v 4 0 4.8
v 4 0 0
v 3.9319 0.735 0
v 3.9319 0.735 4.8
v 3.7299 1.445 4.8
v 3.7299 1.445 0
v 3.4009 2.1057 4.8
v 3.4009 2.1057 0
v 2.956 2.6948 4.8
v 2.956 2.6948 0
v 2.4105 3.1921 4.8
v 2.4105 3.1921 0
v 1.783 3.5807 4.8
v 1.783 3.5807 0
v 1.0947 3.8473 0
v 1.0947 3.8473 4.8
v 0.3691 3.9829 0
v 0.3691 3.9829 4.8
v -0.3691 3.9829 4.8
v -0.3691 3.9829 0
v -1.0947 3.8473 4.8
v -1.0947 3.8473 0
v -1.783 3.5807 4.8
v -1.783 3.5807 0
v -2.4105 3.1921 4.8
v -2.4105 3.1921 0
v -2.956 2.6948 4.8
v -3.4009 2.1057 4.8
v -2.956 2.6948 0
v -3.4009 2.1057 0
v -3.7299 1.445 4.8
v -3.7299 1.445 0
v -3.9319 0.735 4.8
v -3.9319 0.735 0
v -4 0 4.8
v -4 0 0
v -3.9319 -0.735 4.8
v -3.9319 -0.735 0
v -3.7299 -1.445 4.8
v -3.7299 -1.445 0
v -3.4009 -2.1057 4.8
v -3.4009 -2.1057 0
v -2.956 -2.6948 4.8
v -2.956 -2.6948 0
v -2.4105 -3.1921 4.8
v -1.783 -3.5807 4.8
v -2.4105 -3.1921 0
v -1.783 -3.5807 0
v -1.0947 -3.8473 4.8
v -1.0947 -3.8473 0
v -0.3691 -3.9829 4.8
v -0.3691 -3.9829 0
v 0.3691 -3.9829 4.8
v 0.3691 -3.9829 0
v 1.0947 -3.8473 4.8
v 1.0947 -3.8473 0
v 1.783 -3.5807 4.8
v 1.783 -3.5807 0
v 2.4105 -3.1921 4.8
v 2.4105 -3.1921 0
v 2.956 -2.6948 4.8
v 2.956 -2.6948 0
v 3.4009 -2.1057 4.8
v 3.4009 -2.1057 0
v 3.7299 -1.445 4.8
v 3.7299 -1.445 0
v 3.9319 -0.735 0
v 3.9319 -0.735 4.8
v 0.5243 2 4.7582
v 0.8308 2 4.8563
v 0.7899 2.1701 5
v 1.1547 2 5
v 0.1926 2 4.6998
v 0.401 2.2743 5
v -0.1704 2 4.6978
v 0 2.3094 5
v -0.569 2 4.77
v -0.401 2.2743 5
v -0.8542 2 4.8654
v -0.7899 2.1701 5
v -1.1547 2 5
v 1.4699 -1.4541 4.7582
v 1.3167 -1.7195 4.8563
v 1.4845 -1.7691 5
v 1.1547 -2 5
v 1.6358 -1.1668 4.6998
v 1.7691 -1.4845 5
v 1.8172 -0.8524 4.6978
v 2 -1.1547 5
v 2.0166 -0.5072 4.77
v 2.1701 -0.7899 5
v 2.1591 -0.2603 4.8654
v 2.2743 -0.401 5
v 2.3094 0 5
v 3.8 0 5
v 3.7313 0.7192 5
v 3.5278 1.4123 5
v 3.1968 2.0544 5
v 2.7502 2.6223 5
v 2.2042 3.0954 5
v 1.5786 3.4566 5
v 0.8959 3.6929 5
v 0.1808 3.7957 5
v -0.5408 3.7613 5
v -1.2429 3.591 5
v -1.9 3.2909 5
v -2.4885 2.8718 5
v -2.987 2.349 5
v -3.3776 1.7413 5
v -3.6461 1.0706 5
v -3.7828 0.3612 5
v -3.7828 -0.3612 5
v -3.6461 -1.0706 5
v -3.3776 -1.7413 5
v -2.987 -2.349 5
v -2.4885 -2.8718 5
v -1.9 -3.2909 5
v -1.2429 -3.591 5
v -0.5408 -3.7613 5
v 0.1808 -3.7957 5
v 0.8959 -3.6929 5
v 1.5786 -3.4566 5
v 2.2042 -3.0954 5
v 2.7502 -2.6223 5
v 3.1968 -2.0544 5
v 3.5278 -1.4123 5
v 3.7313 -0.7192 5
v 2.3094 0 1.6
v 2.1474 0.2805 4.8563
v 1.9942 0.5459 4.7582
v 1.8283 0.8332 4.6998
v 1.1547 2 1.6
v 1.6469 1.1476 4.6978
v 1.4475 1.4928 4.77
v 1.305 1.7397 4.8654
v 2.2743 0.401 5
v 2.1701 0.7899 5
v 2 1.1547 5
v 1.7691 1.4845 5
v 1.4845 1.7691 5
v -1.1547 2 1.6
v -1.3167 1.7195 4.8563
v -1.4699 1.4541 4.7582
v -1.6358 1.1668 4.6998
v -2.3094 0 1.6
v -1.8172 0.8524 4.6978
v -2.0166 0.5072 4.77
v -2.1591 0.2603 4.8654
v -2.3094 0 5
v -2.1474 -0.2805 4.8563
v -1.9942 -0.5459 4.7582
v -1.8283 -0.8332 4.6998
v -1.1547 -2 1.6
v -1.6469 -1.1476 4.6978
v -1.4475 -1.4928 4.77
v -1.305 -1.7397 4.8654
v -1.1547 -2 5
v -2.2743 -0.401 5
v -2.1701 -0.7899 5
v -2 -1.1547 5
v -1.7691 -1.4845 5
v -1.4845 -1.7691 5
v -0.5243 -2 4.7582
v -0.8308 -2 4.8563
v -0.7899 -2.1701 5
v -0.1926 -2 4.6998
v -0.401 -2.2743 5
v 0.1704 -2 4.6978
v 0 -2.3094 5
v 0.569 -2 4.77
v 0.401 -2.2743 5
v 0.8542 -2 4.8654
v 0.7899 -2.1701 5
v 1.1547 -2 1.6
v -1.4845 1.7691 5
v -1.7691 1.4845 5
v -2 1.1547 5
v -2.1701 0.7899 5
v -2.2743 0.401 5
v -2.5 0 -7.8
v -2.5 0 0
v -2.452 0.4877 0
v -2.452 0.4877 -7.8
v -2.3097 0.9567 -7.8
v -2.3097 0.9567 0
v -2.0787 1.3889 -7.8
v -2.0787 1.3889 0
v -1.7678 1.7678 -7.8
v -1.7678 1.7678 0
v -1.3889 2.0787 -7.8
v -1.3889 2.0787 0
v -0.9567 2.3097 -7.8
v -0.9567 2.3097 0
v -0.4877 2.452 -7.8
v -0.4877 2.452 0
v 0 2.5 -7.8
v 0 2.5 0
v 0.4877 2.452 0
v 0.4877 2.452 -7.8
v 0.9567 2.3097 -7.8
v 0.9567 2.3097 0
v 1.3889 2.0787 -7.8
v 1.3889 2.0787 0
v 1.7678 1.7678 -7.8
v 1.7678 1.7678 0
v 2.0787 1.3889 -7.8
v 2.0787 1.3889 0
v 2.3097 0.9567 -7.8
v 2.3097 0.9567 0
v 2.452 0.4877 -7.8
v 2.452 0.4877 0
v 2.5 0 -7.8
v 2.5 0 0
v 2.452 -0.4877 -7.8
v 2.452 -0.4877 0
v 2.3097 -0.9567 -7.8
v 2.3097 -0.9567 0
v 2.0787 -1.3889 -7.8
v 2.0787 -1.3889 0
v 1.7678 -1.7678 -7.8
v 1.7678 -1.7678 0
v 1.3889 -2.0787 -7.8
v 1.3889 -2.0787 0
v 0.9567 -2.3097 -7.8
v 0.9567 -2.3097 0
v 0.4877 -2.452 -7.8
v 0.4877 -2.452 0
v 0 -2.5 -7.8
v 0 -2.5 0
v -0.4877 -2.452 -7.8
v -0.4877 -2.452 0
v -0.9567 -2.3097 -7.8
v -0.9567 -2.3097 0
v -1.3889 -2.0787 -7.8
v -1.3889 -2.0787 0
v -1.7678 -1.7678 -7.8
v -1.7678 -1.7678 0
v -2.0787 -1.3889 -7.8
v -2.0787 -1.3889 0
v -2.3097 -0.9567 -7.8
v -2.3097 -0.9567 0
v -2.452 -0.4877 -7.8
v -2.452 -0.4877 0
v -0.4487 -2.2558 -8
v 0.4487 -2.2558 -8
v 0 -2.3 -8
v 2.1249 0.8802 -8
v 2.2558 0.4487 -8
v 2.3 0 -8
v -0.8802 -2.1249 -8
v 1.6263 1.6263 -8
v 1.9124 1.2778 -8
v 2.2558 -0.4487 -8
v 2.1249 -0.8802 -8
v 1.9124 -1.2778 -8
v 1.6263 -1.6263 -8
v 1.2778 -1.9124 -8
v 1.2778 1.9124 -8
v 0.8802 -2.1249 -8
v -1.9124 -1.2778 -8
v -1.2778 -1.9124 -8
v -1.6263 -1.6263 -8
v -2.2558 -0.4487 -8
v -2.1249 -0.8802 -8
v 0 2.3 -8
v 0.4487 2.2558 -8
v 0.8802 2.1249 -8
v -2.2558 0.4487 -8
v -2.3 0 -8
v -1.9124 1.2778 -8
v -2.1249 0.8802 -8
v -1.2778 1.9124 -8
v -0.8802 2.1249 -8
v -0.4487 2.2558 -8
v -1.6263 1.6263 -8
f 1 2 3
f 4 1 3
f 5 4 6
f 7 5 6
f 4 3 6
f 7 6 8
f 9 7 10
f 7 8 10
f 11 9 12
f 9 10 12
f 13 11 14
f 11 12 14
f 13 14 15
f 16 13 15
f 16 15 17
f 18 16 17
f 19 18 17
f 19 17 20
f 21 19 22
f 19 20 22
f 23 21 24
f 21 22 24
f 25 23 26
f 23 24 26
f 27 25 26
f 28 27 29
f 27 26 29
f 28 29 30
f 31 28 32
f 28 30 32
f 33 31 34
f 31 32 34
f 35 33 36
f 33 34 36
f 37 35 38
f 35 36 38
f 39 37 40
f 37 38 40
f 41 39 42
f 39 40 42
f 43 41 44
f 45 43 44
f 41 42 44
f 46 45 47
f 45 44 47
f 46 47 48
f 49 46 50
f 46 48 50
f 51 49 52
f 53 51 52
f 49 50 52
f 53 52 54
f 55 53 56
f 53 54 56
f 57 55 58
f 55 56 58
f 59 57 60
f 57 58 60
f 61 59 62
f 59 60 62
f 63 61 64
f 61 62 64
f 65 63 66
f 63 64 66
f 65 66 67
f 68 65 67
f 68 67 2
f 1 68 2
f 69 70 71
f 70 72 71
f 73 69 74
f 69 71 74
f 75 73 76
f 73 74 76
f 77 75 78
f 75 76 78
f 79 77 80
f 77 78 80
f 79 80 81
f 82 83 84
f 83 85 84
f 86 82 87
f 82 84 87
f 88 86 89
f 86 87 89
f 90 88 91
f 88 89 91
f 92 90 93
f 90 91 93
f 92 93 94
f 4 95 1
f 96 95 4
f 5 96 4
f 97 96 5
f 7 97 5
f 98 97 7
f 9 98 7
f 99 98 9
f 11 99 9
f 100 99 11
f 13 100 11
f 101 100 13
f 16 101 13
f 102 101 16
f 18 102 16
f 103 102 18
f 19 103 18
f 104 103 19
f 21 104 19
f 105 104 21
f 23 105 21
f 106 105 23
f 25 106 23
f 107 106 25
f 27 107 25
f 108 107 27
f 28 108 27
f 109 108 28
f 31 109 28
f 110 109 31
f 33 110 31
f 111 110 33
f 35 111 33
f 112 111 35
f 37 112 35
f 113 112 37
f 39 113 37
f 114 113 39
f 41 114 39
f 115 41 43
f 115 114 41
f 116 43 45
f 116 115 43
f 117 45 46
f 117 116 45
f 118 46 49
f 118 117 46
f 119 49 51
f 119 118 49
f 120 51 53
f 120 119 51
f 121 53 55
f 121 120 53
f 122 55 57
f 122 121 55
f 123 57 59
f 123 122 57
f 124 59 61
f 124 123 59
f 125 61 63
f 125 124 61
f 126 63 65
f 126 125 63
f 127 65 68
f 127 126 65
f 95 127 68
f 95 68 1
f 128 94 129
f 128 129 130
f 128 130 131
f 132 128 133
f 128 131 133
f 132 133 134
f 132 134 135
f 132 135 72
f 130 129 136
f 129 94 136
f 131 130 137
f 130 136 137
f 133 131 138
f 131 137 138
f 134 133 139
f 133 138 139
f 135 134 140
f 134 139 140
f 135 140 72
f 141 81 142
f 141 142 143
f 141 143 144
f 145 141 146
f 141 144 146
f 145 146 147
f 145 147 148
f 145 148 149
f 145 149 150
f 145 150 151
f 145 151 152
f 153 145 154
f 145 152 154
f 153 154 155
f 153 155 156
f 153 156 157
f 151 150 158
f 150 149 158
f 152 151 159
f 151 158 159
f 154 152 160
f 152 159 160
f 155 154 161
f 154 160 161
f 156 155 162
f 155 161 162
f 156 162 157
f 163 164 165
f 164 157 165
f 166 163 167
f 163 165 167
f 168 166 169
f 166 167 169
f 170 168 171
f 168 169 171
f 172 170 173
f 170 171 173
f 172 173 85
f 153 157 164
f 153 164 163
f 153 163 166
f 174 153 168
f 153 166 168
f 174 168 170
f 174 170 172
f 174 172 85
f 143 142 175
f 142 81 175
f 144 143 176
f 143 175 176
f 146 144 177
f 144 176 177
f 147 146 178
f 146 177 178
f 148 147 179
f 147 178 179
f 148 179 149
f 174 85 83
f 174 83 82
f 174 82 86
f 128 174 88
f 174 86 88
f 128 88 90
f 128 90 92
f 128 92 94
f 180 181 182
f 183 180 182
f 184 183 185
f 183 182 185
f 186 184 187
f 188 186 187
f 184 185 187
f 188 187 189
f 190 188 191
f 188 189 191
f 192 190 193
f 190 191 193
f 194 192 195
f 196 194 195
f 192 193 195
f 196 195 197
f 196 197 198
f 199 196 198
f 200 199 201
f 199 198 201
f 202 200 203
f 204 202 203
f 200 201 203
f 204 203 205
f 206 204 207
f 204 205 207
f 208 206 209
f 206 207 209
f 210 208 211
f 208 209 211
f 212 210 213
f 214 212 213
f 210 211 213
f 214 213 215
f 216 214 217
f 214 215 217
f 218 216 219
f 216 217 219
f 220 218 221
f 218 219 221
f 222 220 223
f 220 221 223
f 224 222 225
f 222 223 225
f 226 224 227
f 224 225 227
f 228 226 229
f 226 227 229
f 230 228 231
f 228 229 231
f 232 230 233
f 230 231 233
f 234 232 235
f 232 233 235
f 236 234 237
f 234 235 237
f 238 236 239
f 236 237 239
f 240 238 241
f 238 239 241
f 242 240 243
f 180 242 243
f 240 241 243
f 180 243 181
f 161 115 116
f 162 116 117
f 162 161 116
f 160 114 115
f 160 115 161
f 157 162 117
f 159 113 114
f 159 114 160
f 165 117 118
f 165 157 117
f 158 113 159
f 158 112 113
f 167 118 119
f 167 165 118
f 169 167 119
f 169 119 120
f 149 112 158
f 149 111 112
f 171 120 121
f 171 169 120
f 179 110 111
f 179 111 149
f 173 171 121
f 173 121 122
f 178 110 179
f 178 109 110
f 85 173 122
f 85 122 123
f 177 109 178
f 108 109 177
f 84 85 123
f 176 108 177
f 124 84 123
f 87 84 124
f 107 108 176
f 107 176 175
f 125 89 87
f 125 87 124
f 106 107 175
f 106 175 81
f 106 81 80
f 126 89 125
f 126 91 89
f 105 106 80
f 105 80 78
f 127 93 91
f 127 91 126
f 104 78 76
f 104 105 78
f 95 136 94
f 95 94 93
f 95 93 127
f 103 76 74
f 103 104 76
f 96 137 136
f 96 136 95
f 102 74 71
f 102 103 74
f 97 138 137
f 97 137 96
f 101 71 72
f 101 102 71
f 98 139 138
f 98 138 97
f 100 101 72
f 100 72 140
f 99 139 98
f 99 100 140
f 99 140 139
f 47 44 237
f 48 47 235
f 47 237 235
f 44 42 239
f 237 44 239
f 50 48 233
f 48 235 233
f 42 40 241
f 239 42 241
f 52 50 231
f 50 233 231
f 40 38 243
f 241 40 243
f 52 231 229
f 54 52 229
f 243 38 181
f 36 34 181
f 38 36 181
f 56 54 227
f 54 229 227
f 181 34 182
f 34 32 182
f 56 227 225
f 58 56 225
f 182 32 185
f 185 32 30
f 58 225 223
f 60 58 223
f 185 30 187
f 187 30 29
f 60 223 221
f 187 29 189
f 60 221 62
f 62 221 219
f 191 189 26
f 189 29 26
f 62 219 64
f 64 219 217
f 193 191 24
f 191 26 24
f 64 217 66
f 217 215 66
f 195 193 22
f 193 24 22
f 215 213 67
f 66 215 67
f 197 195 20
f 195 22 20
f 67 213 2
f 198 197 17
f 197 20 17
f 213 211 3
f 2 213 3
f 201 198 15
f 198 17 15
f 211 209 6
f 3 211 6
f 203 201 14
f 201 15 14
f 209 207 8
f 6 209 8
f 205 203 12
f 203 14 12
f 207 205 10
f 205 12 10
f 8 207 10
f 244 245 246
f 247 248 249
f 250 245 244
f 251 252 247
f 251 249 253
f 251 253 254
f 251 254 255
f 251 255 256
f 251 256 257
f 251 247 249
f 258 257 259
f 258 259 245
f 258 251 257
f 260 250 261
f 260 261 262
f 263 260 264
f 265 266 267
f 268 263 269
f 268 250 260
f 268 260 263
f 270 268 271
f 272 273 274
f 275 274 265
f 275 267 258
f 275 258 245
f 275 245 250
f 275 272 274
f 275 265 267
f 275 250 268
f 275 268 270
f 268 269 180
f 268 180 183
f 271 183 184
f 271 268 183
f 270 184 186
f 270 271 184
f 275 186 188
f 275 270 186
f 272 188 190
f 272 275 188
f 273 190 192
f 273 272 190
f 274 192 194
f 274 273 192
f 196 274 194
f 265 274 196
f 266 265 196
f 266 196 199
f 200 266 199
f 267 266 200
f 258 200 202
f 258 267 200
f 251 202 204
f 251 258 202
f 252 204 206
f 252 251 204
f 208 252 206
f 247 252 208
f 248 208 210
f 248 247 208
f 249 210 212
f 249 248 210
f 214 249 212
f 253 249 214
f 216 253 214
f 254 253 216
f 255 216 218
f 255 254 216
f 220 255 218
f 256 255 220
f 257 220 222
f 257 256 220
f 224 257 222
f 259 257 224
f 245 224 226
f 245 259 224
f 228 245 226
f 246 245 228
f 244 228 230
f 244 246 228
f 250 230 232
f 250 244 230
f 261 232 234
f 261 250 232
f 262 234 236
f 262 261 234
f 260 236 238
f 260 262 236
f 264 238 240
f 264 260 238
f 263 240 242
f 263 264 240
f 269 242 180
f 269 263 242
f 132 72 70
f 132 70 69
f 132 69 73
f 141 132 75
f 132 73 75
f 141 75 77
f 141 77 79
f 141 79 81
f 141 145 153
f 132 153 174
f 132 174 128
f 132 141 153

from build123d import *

# Parameters (mm, degrees)
SKETCH_1_R          = 4
EXTRUDE_1_DEPTH     = 5
CUT_EXTRUDE_1_DEPTH = 3.4
SKETCH_3_R          = 2.309401077
CUT_EXTRUDE_2_DEPTH = 3.4
CUT_EXTRUDE_2_DRAFT = -45
CHAMFER_1_SIZE      = 0.2
SKETCH_4_R          = 2.5
EXTRUDE_2_DEPTH     = 8
CHAMFER_2_SIZE      = 0.2


with BuildPart() as part:
    # Эскиз1 → Бобышка-Вытянуть1 (new body)
    with BuildSketch(Plane.XY):
        Circle(SKETCH_1_R)
    extrude(amount=EXTRUDE_1_DEPTH)

    # Эскиз2 → Вырез-Вытянуть1 (cut)
    with BuildSketch(Plane.XY.offset(5)):
        Polygon((2.309401077, 0), (1.154700538, 2), (-1.154700538, 2), (-2.309401077, 0), (-1.154700538, -2), (1.154700538, -2), align=None)
    extrude(amount=-CUT_EXTRUDE_1_DEPTH, mode=Mode.SUBTRACT)


with BuildPart() as cut_extrude_2_tool:
    # Эскиз3 → Вырез-Вытянуть2 (with draft: the straight prism first)
    with BuildSketch(Plane.XY.offset(5)):
        Circle(SKETCH_3_R)
    extrude(amount=-CUT_EXTRUDE_2_DEPTH)
    # Вырез-Вытянуть2: the draft: its side faces are tilted about the plane it starts from
    cut_extrude_2_sides = [cut_extrude_2_tool.faces().sort_by_distance(p)[0] for p in [
        (-2.309401077, 0, 3.3),
    ]]
    draft(cut_extrude_2_sides, Plane.XY.offset(5), CUT_EXTRUDE_2_DRAFT)


with BuildPart() as part_1:
    add(part.part)

    # Вырез-Вытянуть2: cut by cut_extrude_2_tool
    add(cut_extrude_2_tool.part, mode=Mode.SUBTRACT)

    # Фаска1
    chamfer_1_edges = [part_1.edges().sort_by_distance(p)[0] for p in [
        (-4, 0, 5),
    ]]
    chamfer(chamfer_1_edges, length=CHAMFER_1_SIZE)

    # Эскиз4 → Бобышка-Вытянуть2 (add)
    with BuildSketch(Plane(origin=(0, 0, 0), x_dir=(-1, 0, 0), z_dir=(0, 0, -1))):
        Circle(SKETCH_4_R)
    extrude(amount=EXTRUDE_2_DEPTH)

    # Фаска2
    chamfer_2_edges = [part_1.edges().sort_by_distance(p)[0] for p in [
        (2.5, 0, -8),
    ]]
    chamfer(chamfer_2_edges, length=CHAMFER_2_SIZE)


solid = part_1.part
